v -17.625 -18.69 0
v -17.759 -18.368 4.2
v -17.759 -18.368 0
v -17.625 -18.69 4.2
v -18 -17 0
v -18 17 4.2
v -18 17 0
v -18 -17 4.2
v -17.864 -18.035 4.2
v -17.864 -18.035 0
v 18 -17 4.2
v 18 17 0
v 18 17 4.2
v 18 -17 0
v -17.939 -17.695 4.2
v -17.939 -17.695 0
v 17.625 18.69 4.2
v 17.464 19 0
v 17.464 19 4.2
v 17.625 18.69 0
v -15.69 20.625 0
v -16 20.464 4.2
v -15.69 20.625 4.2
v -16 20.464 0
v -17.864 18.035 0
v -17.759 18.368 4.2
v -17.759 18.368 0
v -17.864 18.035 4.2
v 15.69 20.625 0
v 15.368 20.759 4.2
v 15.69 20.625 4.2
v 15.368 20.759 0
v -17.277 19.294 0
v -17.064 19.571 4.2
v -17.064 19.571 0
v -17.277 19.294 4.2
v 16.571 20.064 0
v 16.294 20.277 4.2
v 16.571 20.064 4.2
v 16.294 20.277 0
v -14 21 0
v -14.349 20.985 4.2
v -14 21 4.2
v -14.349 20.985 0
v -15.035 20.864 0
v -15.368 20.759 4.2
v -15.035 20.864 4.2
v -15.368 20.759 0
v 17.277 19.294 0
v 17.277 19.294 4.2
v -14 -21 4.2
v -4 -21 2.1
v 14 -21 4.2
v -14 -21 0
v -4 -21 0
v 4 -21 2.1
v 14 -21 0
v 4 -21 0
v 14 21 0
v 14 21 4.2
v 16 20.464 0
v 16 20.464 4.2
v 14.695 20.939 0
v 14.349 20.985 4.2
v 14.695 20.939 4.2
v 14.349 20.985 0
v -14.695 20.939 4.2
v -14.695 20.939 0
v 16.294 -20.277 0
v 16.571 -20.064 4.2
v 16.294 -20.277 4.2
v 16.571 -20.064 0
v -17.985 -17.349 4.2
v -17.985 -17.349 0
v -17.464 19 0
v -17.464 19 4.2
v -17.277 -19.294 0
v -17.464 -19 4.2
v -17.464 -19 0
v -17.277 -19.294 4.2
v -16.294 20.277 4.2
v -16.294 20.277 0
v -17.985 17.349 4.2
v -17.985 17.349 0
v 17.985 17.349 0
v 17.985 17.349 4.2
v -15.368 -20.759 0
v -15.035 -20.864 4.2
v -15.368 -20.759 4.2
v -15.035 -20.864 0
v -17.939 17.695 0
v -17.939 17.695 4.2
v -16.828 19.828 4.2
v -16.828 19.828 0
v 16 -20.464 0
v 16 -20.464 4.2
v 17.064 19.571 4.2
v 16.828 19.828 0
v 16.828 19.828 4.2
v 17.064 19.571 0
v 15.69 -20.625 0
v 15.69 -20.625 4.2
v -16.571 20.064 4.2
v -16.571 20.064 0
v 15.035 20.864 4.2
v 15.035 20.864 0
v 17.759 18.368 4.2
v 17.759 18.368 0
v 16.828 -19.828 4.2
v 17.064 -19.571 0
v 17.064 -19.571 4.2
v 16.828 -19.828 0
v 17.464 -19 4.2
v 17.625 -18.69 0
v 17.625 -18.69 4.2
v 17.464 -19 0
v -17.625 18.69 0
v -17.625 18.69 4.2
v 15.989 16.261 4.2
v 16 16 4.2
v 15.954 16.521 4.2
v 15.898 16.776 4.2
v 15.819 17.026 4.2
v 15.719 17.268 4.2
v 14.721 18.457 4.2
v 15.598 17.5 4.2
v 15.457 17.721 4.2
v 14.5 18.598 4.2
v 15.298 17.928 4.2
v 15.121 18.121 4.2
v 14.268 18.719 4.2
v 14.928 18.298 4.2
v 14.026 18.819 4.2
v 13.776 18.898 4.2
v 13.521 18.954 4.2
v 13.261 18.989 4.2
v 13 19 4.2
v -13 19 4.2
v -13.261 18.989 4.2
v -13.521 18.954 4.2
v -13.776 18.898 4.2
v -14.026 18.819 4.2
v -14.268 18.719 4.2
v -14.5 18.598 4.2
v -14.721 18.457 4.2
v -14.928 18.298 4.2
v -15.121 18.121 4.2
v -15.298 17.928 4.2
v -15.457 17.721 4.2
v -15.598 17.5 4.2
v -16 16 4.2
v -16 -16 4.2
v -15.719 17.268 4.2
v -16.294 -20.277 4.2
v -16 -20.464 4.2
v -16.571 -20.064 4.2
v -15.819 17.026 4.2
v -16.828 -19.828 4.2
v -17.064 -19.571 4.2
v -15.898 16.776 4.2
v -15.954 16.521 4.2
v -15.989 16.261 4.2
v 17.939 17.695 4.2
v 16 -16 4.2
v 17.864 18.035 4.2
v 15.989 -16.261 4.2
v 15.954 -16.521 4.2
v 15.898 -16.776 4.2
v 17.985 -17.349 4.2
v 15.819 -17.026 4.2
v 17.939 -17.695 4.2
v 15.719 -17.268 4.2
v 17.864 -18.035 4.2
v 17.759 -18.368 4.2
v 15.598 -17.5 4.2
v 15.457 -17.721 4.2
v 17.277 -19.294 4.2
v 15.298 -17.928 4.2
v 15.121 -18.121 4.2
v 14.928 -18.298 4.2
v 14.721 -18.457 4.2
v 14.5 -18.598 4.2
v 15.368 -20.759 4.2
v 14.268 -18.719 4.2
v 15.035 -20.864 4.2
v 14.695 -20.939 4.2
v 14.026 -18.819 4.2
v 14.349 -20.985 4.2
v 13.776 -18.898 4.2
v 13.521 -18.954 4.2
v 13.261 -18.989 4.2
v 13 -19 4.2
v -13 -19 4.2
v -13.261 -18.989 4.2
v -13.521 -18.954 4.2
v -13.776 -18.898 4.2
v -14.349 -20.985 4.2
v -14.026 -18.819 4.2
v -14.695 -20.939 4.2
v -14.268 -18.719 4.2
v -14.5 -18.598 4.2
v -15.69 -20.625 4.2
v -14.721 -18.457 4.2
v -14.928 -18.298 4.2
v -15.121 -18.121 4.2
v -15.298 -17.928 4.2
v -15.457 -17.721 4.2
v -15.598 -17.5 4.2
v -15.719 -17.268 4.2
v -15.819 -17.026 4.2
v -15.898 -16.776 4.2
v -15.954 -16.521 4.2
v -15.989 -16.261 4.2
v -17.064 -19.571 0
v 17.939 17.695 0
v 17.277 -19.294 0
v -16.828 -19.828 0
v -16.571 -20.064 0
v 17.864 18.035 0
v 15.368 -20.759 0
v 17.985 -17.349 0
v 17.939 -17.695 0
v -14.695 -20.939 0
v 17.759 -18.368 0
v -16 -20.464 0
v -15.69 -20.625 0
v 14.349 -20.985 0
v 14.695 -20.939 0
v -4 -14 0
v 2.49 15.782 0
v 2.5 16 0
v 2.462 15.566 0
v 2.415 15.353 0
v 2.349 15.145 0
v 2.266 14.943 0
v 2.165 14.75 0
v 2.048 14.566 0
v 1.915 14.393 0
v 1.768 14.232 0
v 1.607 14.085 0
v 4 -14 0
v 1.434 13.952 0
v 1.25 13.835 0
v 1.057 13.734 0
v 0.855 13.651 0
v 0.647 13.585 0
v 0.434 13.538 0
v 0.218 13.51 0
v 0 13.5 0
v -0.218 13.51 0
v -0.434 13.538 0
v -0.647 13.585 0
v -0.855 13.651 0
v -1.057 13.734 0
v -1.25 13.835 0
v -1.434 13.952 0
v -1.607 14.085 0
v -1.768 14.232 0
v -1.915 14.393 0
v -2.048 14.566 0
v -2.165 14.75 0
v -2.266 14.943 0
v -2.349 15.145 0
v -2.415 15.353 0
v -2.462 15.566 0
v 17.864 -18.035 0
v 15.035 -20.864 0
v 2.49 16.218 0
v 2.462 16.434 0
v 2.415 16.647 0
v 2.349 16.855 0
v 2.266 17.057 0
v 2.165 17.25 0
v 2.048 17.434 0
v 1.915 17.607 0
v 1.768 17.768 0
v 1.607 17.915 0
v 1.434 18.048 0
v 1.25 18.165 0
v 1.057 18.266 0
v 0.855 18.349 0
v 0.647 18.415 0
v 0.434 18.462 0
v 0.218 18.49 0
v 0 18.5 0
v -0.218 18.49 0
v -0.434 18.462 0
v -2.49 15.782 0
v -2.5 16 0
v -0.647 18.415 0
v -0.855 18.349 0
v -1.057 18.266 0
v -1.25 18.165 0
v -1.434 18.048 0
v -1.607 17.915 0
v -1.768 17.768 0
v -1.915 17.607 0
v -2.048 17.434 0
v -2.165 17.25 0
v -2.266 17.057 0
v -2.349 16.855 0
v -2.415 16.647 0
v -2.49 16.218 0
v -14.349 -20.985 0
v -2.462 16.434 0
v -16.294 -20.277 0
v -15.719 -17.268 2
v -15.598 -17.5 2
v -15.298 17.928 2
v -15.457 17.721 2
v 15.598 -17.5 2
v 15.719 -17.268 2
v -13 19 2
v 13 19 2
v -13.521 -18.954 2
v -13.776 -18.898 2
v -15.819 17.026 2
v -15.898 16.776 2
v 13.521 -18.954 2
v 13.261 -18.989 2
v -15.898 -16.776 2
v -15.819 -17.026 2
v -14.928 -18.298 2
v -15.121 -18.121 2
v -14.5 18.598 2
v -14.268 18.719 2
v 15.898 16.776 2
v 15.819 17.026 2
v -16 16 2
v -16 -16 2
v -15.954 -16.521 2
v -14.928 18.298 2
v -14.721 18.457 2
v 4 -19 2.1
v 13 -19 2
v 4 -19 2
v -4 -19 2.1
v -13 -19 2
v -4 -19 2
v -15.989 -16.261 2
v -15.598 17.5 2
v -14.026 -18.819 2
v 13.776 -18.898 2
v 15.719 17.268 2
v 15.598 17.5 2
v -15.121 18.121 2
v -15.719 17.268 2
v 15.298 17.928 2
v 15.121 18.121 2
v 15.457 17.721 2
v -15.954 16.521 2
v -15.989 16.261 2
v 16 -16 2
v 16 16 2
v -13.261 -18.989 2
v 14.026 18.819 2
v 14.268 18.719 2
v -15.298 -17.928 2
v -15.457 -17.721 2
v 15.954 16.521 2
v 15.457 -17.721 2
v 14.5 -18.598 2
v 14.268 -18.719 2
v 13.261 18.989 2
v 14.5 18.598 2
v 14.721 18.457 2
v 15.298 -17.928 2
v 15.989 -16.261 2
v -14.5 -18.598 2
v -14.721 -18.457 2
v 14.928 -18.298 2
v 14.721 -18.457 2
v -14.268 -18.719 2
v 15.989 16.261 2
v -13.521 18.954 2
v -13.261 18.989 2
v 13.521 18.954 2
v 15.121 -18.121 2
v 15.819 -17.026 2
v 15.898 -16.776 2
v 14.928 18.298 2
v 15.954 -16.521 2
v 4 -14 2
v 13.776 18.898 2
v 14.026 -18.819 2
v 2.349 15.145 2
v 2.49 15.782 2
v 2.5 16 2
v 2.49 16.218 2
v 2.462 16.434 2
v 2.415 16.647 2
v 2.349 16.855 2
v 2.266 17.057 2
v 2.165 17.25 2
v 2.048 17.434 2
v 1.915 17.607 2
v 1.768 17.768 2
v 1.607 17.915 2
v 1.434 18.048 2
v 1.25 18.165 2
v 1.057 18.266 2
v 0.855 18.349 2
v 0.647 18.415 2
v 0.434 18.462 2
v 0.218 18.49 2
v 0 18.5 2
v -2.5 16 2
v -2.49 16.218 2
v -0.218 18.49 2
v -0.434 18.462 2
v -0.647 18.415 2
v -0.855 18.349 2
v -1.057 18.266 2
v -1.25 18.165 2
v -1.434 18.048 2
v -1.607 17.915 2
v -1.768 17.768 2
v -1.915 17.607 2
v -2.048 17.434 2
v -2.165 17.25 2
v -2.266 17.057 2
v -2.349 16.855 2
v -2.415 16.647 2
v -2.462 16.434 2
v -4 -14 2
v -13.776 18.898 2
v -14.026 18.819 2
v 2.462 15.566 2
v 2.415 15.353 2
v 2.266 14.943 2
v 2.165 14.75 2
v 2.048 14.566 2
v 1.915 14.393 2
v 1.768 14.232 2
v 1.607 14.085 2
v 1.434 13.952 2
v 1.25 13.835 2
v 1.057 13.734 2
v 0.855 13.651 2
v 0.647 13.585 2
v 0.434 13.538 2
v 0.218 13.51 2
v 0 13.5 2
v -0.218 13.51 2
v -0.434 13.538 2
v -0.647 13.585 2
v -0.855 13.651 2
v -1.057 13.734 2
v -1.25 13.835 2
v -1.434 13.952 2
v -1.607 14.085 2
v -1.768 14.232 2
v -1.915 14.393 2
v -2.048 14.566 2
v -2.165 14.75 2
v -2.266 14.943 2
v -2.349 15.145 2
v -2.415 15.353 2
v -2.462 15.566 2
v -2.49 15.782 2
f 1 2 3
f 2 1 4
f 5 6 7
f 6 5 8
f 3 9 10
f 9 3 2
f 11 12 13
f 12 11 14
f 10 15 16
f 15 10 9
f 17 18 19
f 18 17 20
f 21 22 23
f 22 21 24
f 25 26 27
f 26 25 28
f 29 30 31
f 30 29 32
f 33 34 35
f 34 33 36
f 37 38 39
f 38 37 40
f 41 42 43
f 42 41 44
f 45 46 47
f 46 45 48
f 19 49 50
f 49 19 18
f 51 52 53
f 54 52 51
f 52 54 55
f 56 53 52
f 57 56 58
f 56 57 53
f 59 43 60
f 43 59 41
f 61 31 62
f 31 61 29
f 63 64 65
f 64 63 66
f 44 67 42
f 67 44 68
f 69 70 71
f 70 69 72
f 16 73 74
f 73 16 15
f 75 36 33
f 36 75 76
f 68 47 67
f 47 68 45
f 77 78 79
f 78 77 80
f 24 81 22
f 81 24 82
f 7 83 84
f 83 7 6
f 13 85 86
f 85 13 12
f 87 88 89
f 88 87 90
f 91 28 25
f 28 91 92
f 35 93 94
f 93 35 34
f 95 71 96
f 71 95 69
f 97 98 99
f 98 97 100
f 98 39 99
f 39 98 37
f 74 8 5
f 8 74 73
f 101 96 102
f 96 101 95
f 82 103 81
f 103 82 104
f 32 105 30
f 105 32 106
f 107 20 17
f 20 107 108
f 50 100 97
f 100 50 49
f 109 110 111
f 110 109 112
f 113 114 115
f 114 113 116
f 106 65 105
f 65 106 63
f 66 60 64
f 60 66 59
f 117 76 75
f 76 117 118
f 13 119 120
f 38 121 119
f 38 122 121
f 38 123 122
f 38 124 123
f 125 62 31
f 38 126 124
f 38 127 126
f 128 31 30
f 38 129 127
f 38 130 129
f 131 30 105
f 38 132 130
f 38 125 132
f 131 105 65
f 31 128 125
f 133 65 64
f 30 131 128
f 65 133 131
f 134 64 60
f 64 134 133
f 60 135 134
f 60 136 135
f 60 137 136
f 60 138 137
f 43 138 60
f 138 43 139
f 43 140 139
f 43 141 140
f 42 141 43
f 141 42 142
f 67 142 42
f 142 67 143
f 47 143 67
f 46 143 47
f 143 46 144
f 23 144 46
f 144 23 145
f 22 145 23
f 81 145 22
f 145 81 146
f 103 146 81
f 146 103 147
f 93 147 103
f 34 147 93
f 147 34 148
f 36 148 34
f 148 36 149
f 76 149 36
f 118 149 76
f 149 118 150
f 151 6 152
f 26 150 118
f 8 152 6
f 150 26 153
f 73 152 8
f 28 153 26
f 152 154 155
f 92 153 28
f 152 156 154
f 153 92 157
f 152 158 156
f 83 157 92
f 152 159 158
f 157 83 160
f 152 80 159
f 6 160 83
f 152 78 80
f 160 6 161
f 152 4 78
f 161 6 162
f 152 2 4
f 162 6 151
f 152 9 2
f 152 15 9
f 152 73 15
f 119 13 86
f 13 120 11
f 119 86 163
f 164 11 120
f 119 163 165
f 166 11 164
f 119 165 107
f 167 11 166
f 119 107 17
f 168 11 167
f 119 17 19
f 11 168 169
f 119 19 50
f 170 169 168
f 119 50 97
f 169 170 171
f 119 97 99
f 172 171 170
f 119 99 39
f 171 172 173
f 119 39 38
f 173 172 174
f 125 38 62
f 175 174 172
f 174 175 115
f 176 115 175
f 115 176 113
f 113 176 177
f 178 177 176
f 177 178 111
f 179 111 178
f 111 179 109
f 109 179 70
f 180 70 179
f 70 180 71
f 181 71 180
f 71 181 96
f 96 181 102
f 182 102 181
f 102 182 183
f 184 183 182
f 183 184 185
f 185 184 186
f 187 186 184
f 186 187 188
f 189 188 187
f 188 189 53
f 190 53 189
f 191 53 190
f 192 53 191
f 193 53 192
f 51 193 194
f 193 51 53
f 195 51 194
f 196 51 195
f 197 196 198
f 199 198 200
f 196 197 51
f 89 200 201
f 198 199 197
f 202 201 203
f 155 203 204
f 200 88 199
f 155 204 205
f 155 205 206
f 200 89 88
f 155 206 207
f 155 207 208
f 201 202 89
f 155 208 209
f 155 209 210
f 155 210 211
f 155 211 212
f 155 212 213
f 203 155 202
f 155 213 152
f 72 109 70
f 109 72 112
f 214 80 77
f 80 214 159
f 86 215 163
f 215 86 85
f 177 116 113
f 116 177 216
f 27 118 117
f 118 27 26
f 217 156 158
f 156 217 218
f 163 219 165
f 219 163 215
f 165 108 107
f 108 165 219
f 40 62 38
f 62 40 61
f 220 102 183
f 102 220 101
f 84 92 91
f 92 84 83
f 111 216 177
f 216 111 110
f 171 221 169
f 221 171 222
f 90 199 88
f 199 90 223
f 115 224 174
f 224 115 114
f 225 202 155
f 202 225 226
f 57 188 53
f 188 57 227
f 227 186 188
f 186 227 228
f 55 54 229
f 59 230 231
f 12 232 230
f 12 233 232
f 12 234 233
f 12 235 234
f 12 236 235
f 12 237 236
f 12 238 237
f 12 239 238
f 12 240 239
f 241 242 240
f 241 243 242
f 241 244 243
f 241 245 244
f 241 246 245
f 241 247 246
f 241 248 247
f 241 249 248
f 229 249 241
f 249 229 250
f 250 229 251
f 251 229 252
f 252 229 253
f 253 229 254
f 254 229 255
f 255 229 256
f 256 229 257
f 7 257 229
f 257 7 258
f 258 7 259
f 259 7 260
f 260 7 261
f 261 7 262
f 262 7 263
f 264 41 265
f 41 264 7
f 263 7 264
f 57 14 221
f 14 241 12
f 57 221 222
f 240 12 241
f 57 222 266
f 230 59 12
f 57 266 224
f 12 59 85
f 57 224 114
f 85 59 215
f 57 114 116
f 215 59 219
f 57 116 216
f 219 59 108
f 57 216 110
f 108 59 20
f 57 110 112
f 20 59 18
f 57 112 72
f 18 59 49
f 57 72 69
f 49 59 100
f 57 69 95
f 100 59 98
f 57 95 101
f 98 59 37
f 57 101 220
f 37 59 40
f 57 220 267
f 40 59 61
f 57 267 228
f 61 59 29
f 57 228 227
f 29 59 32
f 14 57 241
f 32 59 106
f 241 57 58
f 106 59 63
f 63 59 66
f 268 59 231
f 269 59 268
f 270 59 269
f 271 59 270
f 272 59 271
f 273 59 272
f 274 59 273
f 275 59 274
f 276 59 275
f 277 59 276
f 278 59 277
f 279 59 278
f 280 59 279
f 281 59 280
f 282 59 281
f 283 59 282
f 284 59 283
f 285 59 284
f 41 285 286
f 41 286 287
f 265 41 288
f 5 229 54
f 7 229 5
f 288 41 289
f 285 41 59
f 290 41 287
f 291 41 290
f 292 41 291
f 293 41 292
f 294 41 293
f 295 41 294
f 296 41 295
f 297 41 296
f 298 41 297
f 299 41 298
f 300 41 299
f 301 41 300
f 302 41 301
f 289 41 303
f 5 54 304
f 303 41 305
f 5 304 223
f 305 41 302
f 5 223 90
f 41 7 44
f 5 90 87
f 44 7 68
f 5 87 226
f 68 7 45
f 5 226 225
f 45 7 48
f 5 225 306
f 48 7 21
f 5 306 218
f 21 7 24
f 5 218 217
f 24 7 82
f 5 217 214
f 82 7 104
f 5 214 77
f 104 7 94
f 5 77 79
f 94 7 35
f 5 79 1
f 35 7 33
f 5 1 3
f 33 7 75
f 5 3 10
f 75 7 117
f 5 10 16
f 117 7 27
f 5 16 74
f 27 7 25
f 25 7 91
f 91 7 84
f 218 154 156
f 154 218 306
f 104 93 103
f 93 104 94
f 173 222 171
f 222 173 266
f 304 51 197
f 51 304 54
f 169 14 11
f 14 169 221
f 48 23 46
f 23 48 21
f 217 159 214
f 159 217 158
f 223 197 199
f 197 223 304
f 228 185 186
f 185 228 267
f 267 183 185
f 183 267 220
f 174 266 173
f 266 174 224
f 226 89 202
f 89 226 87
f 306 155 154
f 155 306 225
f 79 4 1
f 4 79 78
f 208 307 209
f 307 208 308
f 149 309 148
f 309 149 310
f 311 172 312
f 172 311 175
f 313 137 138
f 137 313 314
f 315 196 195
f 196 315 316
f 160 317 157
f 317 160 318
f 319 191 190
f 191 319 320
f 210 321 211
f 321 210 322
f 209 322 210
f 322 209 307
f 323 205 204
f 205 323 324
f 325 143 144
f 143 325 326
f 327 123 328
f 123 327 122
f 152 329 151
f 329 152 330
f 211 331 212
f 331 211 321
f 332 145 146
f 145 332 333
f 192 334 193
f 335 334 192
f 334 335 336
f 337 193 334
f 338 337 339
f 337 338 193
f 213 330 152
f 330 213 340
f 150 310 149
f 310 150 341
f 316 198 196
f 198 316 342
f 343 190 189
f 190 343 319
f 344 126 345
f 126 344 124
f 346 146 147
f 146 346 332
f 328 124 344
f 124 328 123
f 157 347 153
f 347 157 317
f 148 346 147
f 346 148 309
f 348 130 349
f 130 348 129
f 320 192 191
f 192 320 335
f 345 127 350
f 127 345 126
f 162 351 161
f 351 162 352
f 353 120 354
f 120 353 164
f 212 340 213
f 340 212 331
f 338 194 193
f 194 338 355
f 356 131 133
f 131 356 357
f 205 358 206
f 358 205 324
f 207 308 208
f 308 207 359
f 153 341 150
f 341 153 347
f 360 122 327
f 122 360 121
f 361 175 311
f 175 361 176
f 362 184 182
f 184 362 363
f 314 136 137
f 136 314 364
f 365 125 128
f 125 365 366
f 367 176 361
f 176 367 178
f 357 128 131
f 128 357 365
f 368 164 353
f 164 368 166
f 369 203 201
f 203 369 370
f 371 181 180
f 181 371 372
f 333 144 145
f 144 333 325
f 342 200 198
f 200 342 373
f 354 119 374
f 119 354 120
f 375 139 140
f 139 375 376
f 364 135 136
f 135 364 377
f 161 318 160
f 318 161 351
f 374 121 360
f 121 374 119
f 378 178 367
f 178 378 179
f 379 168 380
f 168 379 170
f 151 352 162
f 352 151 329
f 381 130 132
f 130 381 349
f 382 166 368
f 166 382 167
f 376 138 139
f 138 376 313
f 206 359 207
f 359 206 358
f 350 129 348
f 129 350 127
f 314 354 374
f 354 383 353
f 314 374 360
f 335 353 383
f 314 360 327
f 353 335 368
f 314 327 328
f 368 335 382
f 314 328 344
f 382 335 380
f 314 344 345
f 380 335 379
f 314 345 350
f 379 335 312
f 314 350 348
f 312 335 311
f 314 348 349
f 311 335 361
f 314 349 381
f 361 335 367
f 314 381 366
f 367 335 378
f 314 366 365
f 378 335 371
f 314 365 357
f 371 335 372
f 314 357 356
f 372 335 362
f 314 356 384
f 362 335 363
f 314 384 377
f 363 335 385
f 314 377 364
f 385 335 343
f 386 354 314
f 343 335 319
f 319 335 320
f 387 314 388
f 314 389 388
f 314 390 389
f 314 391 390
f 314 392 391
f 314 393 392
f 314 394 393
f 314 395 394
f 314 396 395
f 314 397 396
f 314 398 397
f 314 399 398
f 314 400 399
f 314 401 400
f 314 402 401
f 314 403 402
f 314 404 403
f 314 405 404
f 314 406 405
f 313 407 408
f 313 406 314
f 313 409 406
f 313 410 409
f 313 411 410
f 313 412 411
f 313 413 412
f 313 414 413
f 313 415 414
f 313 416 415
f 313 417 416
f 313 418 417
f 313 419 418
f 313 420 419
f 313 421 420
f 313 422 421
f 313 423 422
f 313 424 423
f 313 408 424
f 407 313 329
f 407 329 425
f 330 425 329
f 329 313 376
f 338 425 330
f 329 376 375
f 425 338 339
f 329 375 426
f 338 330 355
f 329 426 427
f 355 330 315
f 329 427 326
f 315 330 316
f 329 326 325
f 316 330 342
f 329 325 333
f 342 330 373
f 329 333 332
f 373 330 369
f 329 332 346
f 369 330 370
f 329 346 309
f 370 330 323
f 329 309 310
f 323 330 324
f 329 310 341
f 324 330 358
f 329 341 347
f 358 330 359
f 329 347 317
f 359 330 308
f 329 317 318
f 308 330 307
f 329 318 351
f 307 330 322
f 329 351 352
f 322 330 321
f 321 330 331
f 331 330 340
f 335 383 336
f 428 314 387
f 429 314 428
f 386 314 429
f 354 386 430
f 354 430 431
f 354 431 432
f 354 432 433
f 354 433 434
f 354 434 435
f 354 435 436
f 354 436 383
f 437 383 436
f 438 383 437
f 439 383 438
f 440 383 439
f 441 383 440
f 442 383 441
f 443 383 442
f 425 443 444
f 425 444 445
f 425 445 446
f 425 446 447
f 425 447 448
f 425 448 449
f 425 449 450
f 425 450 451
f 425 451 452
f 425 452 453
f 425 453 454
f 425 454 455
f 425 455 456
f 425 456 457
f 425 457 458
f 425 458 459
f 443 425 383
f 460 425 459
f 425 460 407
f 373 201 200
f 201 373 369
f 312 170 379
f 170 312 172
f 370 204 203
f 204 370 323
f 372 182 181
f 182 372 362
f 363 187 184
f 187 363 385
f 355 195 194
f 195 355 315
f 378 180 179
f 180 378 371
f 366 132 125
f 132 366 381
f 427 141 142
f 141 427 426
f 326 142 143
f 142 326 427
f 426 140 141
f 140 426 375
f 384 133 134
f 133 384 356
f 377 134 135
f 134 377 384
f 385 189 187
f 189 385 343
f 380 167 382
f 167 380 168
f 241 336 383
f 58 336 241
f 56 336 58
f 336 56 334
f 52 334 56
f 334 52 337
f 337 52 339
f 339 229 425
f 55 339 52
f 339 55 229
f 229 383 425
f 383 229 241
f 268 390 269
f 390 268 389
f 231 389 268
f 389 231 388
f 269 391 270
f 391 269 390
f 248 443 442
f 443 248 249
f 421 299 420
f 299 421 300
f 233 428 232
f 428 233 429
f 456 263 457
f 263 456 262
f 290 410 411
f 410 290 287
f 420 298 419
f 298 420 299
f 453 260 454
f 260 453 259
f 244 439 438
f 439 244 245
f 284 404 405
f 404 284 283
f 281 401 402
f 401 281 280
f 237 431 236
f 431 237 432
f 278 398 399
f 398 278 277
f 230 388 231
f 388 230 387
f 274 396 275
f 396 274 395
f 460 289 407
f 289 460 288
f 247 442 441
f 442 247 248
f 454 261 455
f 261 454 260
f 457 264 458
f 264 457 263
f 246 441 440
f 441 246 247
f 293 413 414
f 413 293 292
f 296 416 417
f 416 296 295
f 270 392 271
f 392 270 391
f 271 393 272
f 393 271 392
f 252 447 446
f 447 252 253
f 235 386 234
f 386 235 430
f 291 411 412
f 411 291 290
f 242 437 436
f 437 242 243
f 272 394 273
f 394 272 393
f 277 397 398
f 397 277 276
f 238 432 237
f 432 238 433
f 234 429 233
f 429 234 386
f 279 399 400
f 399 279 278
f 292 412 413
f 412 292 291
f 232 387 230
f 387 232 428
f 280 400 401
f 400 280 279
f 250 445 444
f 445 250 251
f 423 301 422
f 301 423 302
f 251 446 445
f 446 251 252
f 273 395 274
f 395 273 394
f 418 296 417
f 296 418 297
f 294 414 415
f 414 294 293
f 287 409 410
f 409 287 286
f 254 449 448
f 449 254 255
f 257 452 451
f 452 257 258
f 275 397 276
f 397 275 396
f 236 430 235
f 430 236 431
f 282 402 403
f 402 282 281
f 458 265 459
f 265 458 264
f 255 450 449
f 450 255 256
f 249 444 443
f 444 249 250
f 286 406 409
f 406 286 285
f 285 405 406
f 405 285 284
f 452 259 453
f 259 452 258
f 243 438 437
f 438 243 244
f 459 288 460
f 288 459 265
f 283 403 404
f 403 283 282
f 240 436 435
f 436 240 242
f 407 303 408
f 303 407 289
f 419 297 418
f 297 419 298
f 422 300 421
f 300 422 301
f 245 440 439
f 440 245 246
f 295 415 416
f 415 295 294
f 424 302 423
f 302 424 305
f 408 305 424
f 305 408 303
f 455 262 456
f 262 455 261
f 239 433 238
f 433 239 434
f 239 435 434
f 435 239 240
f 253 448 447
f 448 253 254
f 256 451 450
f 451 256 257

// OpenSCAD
// TS-PET-A02 - Topographic Tag Silencer
$fn = 72; tag_w = 32; tag_h = 38; wall = 2.0; thickness = 4.2; slot_gap = 8; ring_hole_d = 5.0; corner_d = 8; groove_count = 4; groove_depth = 0.45; groove_offset = 2.2;
module rounded_rect_2d(w, h, d) { hull() { translate([-w/2 + d/2, -h/2 + d/2]) circle(d = d); translate([ w/2 - d/2, -h/2 + d/2]) circle(d = d); translate([-w/2 + d/2,  h/2 - d/2]) circle(d = d); translate([ w/2 - d/2,  h/2 - d/2]) circle(d = d);} }
difference() {
    linear_extrude(height = thickness) rounded_rect_2d(tag_w + 2*wall, tag_h + 2*wall, corner_d);
    translate([0,0,wall]) linear_extrude(height = thickness) rounded_rect_2d(tag_w, tag_h, max(4, corner_d - 2));
    translate([0, -(tag_h/2 + wall), -1]) cube([slot_gap, 14, thickness + 2], center = true);
    translate([0, tag_h/2 + wall - 5, -1]) cylinder(h = thickness + 2, d = ring_hole_d);
    for (i = [1:groove_count]) translate([0,0,thickness - groove_depth]) linear_extrude(height = groove_depth + 0.1) offset(delta = -i * groove_offset) rounded_rect_2d(tag_w + 2*wall - 2, tag_h + 2*wall - 2, corner_d - 1);
}
